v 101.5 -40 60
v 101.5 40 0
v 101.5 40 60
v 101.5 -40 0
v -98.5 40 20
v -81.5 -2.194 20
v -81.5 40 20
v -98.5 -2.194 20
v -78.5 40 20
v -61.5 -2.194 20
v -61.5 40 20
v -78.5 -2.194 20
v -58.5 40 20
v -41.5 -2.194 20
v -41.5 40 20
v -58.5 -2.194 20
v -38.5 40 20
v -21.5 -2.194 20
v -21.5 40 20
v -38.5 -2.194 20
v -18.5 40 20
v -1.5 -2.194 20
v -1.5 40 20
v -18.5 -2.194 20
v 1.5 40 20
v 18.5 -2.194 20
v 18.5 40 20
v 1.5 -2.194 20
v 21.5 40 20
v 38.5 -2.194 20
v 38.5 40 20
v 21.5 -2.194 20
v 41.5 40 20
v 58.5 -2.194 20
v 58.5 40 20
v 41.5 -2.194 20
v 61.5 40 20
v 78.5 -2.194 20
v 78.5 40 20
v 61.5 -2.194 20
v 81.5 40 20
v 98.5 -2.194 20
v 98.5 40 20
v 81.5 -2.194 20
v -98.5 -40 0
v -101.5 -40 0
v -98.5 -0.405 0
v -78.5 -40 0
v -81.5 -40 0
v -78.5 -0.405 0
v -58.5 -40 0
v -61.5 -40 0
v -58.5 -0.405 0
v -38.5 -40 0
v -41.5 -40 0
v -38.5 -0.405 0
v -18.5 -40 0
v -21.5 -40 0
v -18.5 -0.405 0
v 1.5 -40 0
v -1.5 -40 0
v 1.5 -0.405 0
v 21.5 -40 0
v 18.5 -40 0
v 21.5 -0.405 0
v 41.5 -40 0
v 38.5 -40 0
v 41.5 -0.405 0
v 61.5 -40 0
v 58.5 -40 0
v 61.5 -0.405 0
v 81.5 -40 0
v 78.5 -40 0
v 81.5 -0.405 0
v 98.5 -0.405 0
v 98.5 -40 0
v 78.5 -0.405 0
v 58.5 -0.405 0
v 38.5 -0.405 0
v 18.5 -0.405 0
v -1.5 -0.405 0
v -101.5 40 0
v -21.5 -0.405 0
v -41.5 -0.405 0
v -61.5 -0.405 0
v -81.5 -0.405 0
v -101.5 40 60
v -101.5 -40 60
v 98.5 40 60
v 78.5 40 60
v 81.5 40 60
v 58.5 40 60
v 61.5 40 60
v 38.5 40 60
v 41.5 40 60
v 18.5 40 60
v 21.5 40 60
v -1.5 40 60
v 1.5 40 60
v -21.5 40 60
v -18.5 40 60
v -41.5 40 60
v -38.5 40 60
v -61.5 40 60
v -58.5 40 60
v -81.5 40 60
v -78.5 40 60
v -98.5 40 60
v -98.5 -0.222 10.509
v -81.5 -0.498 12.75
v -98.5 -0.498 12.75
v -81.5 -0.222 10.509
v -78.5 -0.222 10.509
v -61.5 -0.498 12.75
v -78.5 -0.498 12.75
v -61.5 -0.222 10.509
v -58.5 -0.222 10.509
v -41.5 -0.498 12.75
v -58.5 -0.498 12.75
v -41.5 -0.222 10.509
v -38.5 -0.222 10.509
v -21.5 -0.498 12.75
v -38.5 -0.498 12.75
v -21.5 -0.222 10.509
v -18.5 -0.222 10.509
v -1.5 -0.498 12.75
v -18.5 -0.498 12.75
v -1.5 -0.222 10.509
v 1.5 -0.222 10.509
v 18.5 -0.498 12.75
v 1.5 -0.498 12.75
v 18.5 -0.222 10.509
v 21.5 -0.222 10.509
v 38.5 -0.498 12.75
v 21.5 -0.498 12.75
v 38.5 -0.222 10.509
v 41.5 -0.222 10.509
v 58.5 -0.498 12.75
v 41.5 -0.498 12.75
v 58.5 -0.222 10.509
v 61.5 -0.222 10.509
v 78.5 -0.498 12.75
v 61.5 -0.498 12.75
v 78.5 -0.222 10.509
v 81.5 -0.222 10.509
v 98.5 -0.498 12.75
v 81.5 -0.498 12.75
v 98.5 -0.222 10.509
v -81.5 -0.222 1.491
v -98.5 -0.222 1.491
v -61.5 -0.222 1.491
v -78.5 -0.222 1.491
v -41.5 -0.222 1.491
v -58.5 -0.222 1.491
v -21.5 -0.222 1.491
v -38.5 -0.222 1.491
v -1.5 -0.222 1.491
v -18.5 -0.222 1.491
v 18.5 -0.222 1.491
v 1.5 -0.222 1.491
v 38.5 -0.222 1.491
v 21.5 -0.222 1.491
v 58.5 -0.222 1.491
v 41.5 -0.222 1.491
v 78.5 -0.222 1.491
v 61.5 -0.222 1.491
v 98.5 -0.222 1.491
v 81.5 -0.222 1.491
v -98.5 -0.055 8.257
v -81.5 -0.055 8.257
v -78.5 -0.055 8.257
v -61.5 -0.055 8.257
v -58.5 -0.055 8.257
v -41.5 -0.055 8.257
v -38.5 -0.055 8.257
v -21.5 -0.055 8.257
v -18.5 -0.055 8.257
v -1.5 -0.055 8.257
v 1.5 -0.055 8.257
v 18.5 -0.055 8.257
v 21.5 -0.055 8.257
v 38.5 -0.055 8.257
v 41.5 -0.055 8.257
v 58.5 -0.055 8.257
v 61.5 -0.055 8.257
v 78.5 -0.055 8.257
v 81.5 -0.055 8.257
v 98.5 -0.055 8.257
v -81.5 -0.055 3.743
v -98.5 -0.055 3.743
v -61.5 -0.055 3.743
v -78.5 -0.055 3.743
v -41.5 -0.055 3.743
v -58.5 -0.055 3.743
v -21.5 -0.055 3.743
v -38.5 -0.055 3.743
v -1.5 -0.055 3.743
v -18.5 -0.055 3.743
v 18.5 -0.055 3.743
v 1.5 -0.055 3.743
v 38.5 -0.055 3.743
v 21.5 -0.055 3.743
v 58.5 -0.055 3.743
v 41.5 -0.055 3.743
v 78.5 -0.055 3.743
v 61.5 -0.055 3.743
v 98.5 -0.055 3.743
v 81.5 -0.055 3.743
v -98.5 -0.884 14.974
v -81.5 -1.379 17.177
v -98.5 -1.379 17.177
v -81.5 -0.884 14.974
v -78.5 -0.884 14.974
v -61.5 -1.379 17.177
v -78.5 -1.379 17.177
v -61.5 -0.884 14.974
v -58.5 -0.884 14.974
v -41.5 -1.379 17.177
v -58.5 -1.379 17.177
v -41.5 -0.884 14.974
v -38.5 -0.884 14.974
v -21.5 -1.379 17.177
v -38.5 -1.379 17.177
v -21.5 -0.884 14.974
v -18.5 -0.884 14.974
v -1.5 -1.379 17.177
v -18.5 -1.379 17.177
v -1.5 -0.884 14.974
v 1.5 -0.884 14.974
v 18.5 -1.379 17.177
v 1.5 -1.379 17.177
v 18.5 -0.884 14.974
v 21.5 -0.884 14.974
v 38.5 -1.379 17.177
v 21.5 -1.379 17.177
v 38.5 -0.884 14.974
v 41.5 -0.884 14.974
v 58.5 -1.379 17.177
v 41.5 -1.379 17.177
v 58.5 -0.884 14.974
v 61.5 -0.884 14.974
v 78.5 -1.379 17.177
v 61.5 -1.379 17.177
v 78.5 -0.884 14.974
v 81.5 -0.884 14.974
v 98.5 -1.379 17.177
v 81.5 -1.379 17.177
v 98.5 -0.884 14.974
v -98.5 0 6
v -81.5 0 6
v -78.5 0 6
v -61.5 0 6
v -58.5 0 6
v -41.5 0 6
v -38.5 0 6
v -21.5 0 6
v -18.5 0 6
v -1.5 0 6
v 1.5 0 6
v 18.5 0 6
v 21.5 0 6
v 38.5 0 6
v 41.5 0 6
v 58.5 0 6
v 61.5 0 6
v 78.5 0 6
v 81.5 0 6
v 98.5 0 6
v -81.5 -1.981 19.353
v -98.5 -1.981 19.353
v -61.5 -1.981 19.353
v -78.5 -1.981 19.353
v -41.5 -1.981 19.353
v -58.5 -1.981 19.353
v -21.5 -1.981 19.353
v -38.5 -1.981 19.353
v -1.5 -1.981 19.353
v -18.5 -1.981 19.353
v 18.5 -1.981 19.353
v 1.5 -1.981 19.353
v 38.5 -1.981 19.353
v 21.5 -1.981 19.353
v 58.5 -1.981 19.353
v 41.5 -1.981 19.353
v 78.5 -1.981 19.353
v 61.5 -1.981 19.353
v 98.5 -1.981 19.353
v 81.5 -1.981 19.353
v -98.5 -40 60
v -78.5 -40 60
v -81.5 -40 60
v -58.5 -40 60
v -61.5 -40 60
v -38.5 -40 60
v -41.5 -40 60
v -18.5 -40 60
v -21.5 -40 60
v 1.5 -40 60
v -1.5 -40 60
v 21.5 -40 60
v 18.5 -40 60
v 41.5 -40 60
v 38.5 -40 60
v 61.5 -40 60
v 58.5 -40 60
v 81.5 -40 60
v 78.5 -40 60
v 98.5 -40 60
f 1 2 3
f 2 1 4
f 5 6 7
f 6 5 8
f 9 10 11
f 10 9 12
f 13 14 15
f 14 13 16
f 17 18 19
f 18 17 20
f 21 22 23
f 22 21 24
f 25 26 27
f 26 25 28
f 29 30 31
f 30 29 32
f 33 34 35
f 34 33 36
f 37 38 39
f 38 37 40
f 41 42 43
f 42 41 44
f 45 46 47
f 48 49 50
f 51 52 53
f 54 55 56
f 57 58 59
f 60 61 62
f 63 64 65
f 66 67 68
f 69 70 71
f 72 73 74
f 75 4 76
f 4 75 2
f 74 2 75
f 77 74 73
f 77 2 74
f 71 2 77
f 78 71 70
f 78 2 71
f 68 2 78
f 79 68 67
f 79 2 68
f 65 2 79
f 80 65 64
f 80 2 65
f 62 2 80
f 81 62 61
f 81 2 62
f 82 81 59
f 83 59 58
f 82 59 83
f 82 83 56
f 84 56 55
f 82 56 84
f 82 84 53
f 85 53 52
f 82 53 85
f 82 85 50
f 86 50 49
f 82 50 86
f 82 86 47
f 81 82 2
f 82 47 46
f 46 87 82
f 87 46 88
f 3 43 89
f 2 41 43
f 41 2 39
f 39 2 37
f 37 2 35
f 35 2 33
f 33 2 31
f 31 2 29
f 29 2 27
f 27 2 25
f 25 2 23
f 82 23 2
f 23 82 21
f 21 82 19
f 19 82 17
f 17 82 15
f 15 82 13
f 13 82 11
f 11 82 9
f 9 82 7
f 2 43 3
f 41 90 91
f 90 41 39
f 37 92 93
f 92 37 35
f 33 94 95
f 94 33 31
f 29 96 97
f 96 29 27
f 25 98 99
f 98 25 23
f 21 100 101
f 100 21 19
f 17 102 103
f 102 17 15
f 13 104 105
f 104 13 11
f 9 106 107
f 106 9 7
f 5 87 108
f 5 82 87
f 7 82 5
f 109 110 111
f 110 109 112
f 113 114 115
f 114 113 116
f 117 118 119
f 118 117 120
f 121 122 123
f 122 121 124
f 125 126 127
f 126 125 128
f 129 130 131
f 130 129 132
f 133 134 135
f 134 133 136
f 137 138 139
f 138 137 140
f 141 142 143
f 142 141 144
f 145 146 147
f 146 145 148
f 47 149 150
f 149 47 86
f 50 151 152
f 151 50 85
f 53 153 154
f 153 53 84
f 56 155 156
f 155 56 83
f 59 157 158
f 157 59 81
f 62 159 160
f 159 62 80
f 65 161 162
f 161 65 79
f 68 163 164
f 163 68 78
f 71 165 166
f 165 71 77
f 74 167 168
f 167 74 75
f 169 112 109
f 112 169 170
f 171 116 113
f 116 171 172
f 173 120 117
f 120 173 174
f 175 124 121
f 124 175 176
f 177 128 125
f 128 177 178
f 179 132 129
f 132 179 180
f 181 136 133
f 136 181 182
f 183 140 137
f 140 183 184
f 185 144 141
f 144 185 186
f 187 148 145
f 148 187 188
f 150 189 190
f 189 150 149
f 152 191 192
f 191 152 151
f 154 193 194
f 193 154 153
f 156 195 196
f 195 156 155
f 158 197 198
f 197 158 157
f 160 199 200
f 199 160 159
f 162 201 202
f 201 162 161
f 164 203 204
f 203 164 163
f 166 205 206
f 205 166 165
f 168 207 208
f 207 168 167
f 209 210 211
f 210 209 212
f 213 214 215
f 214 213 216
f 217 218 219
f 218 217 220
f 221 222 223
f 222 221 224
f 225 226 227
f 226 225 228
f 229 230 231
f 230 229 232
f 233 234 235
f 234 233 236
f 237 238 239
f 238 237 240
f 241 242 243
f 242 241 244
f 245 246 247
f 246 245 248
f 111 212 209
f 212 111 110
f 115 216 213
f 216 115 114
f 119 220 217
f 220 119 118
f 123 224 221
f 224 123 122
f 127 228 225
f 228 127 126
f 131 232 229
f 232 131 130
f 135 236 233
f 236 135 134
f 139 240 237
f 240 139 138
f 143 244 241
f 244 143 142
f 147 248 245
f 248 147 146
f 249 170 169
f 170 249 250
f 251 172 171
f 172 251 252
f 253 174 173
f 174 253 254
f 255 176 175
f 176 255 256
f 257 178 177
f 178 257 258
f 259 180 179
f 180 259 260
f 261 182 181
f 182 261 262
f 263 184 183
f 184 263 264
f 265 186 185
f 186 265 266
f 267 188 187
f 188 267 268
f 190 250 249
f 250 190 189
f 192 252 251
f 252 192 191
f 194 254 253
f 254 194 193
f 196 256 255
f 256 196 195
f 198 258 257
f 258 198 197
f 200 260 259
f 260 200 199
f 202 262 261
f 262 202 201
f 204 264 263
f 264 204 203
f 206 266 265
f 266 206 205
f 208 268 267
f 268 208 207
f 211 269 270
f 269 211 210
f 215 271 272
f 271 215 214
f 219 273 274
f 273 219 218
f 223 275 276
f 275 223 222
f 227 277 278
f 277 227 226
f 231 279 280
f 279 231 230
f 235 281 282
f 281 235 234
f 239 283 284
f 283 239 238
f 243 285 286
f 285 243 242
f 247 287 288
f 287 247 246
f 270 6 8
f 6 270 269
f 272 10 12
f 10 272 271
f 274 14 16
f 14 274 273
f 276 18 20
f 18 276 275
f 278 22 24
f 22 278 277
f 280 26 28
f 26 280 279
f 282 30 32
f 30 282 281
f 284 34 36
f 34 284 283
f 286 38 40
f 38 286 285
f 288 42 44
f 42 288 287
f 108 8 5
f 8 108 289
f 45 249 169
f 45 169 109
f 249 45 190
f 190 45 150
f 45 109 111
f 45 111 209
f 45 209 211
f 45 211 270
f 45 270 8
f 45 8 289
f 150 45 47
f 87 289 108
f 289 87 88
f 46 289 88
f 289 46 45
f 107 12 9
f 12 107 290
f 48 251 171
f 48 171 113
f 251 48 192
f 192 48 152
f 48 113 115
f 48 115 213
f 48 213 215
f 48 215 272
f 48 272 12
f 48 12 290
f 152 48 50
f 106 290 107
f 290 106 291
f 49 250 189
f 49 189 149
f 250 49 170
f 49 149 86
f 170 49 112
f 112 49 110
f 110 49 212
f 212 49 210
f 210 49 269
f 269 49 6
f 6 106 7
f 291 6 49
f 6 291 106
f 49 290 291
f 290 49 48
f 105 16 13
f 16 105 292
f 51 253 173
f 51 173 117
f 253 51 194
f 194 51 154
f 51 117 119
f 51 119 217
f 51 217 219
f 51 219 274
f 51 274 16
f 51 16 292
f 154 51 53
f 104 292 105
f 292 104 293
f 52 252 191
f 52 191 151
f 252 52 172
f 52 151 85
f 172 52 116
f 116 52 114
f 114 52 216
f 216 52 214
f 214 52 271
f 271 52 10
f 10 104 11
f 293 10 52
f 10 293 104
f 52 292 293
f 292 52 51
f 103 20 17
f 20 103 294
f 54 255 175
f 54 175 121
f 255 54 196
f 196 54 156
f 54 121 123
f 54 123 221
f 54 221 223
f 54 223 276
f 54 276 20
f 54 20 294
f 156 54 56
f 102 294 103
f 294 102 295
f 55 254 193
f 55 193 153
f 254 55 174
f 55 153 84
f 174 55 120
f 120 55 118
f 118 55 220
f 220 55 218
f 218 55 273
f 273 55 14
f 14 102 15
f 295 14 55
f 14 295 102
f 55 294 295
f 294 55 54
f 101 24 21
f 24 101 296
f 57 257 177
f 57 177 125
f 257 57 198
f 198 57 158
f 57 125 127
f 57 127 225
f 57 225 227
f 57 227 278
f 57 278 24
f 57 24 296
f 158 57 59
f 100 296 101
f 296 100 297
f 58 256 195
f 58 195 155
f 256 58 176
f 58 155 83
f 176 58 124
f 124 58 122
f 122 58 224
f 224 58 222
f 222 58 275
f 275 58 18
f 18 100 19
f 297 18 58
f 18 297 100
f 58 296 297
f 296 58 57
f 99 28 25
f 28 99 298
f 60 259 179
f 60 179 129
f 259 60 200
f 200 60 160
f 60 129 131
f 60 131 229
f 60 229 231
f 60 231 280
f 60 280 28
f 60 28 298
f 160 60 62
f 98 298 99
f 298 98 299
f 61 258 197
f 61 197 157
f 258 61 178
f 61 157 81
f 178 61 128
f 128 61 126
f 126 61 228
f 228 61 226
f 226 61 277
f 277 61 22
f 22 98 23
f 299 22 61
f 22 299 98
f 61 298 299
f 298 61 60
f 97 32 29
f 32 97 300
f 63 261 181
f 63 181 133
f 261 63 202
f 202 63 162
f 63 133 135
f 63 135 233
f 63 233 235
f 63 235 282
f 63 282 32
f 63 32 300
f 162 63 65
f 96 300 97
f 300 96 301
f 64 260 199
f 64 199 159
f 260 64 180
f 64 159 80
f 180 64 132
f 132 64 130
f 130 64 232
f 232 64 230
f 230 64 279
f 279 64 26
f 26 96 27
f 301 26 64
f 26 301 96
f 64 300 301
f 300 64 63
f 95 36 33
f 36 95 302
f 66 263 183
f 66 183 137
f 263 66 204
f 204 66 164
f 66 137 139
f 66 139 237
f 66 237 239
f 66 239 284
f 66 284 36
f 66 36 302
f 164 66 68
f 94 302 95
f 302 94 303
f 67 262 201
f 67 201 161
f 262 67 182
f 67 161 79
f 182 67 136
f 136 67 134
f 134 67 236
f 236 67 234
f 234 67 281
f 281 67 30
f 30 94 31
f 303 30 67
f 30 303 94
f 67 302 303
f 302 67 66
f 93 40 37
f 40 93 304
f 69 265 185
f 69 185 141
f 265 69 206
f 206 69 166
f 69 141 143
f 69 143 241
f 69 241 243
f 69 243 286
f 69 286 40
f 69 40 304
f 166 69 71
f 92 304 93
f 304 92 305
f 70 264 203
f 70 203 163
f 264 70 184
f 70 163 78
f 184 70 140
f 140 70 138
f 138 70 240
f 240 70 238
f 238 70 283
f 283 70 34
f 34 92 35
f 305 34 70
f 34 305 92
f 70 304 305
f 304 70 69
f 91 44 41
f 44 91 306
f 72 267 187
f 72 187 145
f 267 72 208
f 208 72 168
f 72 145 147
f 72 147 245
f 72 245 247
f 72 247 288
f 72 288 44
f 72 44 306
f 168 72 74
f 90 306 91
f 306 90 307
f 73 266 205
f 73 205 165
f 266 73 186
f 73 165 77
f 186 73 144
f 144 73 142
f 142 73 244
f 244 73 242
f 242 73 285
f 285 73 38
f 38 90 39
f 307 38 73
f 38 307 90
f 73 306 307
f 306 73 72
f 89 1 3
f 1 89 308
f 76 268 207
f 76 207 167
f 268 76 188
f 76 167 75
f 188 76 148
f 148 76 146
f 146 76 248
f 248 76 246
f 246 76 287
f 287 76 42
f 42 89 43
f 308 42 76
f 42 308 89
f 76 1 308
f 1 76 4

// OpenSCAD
// Petri Dish Rack
// Designed for 90mm diameter dishes standing on edge.

// Dimensions
L         = 203;    // Base length (X)
W         = 80;     // Base width (Y)
H_base    = 20;     // Base height (Z)
dish_rad  = 45;     // Radius of 90mm dish
cradle_r  = 46;     // Radius of the cradle cutout
cradle_z  = 52;    // Z-coordinate of the cylinder axis
cradle_y  = 0;     // Y-coordinate of the cylinder axis (centered)
divider_t = 3;      // Thickness of divider plates
divider_h  = 60;    // Height of divider plates
num_divs  = 11;     // Number of divider plates

$fn = 128;

// Modules
module base_part() {
    // Base is 203x80x20, centered on X and Y, sitting on Z=0
    translate([-L/2, -W/2, 0])
        cube([L, W, H_base]);
}

module cradle_cutout() {
    // The cradle is a cylinder axis along X.
    // Axis is at y = 0, z = 52.
    // Radius is 46.
    // To ensure it cuts through the base, we translate it along X.
    // We do NOT translate Y here because the cylinder axis should be at Y=0.
    translate([-L/2 - 1, -cradle_r, cradle_z - cradle_r])
        rotate([0, 90, 0])
            cylinder(h = L + 2, r = cradle_r);
}

module divider_part(x_pos) {
    // Dividers are 3mm thick in X, 80mm wide in Y, 60mm tall in Z.
    // They are centered on the x_pos.
    translate([x_pos - divider_t/2, -W/2, 0])
        cube([divider_t, W, divider_h]);
}

// Final Assembly
// 1. Create the base with the cradle cut out of it.
// 2. Add the dividers on top.
// This ensures the cradle is not cut through the dividers.
union() {
    // The Base with the cradle cut out
    difference() {
        base_part();
        cradle_cutout();
    }
    
    // The 11 Divider plates
    // Spaced 20mm apart from -100 to 100
    for (i = [0 : num_divs - 1]) {
        x_pos = -100 + (i * 20);
        divider_part(x_pos);
    }
}
